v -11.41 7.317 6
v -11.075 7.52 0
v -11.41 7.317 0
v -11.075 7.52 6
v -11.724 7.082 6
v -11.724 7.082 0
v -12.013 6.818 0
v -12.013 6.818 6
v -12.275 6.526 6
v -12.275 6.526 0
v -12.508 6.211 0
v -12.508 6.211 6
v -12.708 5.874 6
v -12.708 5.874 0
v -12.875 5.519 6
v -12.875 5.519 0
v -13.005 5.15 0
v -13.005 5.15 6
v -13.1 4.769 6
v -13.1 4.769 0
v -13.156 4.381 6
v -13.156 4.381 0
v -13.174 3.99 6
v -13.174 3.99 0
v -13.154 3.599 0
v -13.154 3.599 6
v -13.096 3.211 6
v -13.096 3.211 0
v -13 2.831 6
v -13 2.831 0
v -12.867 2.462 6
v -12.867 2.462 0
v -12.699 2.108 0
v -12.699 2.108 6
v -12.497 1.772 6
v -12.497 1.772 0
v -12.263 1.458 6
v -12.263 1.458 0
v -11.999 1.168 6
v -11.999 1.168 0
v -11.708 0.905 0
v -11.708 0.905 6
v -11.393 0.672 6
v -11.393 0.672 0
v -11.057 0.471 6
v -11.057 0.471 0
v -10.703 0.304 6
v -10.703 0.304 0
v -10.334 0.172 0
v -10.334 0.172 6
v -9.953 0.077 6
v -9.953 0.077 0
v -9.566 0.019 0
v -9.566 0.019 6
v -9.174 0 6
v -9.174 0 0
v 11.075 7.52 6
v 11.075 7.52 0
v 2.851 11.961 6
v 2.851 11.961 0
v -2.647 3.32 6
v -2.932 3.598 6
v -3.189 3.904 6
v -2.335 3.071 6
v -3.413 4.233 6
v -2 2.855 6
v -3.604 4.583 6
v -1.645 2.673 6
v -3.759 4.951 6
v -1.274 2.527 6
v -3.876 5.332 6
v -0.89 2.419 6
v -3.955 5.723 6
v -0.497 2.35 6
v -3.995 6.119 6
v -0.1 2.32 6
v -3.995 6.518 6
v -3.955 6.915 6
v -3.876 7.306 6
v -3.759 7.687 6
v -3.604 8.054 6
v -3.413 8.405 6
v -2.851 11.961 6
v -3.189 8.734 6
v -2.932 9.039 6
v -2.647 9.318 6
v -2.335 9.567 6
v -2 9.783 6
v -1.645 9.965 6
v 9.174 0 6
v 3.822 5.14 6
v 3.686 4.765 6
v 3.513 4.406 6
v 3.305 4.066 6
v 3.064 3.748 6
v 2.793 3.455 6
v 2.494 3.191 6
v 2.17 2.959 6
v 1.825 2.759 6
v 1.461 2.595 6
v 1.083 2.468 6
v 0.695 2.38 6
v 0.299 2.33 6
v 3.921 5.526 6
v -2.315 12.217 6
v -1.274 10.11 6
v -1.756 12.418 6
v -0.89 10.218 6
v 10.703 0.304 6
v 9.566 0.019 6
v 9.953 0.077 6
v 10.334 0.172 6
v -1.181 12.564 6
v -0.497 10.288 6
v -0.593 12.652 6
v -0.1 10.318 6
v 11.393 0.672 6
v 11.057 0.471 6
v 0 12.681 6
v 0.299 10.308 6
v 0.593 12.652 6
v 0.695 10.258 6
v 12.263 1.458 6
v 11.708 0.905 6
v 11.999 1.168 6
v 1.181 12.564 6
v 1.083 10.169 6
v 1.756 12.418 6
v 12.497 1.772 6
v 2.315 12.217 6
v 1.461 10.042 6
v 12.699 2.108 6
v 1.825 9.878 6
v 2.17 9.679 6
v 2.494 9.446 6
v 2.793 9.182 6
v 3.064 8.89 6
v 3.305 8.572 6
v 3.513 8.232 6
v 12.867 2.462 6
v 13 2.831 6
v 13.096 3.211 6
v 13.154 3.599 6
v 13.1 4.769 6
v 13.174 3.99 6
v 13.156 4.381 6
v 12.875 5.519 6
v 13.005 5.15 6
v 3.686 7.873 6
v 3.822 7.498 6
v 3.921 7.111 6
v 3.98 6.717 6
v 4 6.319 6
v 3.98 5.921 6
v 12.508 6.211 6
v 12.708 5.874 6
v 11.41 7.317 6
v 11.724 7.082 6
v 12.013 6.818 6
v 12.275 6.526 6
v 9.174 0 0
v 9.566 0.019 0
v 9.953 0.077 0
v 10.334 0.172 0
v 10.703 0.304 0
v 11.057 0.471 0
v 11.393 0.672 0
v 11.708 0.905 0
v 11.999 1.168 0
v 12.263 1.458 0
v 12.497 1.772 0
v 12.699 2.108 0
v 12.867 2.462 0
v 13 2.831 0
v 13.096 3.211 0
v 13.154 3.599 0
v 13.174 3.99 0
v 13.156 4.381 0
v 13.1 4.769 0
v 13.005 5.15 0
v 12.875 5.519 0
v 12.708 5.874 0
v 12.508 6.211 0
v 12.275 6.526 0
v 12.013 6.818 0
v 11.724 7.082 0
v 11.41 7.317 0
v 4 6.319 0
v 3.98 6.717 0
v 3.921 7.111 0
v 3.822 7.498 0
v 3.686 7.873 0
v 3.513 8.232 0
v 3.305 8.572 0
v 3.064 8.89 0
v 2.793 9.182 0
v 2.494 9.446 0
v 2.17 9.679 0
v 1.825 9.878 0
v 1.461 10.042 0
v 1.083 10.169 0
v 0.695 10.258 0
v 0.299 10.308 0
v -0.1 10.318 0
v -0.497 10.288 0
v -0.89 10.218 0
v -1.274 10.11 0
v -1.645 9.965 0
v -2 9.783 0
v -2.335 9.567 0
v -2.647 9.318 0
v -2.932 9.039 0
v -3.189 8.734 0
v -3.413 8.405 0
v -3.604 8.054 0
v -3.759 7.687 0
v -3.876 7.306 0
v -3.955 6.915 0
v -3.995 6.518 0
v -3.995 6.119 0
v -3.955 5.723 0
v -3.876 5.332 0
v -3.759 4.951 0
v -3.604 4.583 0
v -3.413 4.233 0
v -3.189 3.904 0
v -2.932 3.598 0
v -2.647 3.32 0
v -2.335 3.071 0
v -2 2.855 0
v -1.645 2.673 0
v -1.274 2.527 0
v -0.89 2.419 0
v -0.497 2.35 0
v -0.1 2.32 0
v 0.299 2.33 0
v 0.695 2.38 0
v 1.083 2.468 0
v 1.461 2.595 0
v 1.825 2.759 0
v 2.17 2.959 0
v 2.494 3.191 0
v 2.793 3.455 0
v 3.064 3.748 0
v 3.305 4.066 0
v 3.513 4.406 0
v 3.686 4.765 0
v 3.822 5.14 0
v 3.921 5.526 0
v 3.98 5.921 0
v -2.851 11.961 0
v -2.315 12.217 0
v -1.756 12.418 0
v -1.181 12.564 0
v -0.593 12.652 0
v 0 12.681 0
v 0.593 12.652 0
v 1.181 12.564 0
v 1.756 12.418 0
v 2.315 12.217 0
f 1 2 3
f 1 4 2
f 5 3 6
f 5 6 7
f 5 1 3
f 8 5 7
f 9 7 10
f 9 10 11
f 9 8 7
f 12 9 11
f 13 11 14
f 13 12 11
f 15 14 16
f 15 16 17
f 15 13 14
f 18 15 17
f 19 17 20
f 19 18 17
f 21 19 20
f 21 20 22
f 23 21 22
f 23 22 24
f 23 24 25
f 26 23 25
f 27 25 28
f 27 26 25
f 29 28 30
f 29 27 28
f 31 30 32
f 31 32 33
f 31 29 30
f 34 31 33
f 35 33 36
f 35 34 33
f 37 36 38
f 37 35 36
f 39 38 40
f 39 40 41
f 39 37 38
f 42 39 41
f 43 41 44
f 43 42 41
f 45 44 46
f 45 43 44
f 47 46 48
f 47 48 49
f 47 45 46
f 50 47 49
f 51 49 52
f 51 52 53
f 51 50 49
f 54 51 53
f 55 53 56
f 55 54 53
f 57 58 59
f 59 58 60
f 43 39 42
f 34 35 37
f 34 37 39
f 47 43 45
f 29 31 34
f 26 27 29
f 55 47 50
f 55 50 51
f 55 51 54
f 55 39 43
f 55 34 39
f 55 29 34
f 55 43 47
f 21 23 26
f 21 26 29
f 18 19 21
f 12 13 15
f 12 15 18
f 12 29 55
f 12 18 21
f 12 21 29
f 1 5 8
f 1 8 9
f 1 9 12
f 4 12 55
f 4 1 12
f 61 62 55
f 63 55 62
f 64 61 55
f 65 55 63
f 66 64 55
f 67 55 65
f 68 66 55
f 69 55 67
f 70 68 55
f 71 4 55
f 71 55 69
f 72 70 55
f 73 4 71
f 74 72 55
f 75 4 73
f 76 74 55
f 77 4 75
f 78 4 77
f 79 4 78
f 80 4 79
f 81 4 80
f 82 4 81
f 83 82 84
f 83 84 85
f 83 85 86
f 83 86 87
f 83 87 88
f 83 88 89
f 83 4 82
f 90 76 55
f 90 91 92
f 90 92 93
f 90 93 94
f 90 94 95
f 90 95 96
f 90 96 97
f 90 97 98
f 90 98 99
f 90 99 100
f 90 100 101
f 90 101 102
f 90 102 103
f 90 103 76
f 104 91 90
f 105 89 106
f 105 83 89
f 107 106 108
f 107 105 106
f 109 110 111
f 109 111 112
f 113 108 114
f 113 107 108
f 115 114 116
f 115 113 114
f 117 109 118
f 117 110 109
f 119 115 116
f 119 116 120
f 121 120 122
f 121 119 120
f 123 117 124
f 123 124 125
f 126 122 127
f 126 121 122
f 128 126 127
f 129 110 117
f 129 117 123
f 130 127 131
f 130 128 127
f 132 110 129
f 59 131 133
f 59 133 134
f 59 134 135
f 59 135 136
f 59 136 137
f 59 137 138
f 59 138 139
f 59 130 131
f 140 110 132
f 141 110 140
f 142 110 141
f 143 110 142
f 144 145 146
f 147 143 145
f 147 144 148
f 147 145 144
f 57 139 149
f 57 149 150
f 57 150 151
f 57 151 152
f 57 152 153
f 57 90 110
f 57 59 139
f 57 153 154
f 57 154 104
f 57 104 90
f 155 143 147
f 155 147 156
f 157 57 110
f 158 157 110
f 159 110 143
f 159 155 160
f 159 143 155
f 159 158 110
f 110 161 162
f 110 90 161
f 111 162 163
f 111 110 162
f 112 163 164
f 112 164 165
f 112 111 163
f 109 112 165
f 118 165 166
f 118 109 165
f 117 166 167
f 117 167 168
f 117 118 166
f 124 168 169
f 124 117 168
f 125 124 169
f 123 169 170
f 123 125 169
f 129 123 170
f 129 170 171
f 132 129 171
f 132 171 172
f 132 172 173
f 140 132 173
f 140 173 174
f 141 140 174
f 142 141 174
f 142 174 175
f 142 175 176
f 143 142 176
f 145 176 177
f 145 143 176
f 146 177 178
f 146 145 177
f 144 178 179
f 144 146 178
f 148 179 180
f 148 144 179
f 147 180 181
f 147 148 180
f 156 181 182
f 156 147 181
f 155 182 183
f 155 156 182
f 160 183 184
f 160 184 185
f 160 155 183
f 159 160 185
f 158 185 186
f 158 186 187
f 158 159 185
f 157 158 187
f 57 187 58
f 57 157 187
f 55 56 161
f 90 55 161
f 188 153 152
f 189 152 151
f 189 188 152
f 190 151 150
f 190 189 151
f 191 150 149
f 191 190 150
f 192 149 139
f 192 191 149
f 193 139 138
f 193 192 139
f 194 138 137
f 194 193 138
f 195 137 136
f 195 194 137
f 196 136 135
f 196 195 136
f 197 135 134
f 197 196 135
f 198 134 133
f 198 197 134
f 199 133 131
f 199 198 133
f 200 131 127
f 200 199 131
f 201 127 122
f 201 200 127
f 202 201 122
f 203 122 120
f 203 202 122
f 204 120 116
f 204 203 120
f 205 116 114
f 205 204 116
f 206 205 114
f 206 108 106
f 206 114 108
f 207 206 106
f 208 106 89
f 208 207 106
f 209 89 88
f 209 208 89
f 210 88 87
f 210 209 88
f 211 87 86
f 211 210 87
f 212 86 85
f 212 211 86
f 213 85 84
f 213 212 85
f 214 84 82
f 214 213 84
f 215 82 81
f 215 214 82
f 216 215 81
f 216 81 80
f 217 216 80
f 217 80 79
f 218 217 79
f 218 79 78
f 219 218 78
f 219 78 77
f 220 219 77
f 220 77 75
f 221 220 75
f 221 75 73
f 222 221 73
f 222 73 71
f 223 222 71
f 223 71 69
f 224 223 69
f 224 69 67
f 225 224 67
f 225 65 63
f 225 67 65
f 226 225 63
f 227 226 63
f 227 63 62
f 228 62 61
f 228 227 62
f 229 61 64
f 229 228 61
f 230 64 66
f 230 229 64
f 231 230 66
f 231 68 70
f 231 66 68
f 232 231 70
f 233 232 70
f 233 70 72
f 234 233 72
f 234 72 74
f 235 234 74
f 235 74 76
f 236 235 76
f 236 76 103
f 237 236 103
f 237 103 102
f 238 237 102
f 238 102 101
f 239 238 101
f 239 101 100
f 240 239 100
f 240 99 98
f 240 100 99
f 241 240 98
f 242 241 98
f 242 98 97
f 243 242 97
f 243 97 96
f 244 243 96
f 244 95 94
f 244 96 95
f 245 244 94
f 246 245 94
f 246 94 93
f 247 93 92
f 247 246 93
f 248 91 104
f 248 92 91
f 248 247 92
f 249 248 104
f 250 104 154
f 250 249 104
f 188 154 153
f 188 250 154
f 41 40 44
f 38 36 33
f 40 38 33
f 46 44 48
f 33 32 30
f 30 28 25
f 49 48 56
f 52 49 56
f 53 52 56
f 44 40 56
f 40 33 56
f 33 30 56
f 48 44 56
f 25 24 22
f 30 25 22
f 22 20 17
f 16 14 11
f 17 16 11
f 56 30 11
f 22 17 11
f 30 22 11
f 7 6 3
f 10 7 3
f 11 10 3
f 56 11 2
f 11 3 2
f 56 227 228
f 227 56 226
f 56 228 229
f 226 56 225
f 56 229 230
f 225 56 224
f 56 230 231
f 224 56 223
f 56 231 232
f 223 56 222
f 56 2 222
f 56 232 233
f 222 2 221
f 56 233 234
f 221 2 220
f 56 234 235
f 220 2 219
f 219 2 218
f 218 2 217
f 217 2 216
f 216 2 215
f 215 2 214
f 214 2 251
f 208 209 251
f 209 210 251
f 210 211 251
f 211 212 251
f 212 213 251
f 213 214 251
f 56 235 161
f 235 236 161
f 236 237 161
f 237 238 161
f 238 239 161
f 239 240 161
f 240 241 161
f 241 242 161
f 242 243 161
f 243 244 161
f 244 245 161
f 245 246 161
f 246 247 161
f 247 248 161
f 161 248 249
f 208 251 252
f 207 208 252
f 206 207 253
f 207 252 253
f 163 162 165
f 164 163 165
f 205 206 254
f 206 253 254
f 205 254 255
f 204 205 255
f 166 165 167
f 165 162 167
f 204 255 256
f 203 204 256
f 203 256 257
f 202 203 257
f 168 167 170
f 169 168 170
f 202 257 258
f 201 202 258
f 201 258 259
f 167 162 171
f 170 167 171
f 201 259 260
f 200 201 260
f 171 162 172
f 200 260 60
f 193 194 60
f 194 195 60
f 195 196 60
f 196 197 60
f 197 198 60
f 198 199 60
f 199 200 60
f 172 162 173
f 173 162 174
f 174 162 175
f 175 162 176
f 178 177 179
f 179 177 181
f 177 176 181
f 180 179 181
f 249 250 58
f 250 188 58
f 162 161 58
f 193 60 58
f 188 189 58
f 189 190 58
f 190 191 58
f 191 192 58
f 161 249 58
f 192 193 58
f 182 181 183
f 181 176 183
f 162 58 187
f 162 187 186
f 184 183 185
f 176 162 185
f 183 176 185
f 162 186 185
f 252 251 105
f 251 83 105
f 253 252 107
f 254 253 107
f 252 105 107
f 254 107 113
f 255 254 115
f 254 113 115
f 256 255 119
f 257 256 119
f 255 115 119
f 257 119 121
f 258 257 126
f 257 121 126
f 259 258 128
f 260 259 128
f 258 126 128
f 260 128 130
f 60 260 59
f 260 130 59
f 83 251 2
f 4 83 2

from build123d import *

# Parameters (mm, degrees)
F1_DEPTH = 6
F2_R     = 4
F3_R     = 6
F4_R     = 4
F5_DEPTH = 6.001


with BuildPart() as f1:
    # F0 (on Top) → F1 (new body)
    with BuildSketch(Plane.XY):
        Polygon((0, 13.5), (-25, 0), (25, 0), align=None)
    extrude(amount=F1_DEPTH)

    # F2
    f2_edges = [f1.edges().sort_by_distance(p)[0] for p in [
        (25, 0, 3),
        (-25, 0, 3),
    ]]
    fillet(f2_edges, radius=F2_R)

    # F3
    f3_edges = [f1.edges().sort_by_distance(p)[0] for p in [
        (0, 13.5, 3),
    ]]
    fillet(f3_edges, radius=F3_R)

    # F4 (on Top) → F5 (cut, through all)
    with BuildSketch(Plane.XY):
        with Locations((0, 6.318788)):
            Circle(F4_R)
    extrude(amount=F5_DEPTH, mode=Mode.SUBTRACT)


solid = f1.part
